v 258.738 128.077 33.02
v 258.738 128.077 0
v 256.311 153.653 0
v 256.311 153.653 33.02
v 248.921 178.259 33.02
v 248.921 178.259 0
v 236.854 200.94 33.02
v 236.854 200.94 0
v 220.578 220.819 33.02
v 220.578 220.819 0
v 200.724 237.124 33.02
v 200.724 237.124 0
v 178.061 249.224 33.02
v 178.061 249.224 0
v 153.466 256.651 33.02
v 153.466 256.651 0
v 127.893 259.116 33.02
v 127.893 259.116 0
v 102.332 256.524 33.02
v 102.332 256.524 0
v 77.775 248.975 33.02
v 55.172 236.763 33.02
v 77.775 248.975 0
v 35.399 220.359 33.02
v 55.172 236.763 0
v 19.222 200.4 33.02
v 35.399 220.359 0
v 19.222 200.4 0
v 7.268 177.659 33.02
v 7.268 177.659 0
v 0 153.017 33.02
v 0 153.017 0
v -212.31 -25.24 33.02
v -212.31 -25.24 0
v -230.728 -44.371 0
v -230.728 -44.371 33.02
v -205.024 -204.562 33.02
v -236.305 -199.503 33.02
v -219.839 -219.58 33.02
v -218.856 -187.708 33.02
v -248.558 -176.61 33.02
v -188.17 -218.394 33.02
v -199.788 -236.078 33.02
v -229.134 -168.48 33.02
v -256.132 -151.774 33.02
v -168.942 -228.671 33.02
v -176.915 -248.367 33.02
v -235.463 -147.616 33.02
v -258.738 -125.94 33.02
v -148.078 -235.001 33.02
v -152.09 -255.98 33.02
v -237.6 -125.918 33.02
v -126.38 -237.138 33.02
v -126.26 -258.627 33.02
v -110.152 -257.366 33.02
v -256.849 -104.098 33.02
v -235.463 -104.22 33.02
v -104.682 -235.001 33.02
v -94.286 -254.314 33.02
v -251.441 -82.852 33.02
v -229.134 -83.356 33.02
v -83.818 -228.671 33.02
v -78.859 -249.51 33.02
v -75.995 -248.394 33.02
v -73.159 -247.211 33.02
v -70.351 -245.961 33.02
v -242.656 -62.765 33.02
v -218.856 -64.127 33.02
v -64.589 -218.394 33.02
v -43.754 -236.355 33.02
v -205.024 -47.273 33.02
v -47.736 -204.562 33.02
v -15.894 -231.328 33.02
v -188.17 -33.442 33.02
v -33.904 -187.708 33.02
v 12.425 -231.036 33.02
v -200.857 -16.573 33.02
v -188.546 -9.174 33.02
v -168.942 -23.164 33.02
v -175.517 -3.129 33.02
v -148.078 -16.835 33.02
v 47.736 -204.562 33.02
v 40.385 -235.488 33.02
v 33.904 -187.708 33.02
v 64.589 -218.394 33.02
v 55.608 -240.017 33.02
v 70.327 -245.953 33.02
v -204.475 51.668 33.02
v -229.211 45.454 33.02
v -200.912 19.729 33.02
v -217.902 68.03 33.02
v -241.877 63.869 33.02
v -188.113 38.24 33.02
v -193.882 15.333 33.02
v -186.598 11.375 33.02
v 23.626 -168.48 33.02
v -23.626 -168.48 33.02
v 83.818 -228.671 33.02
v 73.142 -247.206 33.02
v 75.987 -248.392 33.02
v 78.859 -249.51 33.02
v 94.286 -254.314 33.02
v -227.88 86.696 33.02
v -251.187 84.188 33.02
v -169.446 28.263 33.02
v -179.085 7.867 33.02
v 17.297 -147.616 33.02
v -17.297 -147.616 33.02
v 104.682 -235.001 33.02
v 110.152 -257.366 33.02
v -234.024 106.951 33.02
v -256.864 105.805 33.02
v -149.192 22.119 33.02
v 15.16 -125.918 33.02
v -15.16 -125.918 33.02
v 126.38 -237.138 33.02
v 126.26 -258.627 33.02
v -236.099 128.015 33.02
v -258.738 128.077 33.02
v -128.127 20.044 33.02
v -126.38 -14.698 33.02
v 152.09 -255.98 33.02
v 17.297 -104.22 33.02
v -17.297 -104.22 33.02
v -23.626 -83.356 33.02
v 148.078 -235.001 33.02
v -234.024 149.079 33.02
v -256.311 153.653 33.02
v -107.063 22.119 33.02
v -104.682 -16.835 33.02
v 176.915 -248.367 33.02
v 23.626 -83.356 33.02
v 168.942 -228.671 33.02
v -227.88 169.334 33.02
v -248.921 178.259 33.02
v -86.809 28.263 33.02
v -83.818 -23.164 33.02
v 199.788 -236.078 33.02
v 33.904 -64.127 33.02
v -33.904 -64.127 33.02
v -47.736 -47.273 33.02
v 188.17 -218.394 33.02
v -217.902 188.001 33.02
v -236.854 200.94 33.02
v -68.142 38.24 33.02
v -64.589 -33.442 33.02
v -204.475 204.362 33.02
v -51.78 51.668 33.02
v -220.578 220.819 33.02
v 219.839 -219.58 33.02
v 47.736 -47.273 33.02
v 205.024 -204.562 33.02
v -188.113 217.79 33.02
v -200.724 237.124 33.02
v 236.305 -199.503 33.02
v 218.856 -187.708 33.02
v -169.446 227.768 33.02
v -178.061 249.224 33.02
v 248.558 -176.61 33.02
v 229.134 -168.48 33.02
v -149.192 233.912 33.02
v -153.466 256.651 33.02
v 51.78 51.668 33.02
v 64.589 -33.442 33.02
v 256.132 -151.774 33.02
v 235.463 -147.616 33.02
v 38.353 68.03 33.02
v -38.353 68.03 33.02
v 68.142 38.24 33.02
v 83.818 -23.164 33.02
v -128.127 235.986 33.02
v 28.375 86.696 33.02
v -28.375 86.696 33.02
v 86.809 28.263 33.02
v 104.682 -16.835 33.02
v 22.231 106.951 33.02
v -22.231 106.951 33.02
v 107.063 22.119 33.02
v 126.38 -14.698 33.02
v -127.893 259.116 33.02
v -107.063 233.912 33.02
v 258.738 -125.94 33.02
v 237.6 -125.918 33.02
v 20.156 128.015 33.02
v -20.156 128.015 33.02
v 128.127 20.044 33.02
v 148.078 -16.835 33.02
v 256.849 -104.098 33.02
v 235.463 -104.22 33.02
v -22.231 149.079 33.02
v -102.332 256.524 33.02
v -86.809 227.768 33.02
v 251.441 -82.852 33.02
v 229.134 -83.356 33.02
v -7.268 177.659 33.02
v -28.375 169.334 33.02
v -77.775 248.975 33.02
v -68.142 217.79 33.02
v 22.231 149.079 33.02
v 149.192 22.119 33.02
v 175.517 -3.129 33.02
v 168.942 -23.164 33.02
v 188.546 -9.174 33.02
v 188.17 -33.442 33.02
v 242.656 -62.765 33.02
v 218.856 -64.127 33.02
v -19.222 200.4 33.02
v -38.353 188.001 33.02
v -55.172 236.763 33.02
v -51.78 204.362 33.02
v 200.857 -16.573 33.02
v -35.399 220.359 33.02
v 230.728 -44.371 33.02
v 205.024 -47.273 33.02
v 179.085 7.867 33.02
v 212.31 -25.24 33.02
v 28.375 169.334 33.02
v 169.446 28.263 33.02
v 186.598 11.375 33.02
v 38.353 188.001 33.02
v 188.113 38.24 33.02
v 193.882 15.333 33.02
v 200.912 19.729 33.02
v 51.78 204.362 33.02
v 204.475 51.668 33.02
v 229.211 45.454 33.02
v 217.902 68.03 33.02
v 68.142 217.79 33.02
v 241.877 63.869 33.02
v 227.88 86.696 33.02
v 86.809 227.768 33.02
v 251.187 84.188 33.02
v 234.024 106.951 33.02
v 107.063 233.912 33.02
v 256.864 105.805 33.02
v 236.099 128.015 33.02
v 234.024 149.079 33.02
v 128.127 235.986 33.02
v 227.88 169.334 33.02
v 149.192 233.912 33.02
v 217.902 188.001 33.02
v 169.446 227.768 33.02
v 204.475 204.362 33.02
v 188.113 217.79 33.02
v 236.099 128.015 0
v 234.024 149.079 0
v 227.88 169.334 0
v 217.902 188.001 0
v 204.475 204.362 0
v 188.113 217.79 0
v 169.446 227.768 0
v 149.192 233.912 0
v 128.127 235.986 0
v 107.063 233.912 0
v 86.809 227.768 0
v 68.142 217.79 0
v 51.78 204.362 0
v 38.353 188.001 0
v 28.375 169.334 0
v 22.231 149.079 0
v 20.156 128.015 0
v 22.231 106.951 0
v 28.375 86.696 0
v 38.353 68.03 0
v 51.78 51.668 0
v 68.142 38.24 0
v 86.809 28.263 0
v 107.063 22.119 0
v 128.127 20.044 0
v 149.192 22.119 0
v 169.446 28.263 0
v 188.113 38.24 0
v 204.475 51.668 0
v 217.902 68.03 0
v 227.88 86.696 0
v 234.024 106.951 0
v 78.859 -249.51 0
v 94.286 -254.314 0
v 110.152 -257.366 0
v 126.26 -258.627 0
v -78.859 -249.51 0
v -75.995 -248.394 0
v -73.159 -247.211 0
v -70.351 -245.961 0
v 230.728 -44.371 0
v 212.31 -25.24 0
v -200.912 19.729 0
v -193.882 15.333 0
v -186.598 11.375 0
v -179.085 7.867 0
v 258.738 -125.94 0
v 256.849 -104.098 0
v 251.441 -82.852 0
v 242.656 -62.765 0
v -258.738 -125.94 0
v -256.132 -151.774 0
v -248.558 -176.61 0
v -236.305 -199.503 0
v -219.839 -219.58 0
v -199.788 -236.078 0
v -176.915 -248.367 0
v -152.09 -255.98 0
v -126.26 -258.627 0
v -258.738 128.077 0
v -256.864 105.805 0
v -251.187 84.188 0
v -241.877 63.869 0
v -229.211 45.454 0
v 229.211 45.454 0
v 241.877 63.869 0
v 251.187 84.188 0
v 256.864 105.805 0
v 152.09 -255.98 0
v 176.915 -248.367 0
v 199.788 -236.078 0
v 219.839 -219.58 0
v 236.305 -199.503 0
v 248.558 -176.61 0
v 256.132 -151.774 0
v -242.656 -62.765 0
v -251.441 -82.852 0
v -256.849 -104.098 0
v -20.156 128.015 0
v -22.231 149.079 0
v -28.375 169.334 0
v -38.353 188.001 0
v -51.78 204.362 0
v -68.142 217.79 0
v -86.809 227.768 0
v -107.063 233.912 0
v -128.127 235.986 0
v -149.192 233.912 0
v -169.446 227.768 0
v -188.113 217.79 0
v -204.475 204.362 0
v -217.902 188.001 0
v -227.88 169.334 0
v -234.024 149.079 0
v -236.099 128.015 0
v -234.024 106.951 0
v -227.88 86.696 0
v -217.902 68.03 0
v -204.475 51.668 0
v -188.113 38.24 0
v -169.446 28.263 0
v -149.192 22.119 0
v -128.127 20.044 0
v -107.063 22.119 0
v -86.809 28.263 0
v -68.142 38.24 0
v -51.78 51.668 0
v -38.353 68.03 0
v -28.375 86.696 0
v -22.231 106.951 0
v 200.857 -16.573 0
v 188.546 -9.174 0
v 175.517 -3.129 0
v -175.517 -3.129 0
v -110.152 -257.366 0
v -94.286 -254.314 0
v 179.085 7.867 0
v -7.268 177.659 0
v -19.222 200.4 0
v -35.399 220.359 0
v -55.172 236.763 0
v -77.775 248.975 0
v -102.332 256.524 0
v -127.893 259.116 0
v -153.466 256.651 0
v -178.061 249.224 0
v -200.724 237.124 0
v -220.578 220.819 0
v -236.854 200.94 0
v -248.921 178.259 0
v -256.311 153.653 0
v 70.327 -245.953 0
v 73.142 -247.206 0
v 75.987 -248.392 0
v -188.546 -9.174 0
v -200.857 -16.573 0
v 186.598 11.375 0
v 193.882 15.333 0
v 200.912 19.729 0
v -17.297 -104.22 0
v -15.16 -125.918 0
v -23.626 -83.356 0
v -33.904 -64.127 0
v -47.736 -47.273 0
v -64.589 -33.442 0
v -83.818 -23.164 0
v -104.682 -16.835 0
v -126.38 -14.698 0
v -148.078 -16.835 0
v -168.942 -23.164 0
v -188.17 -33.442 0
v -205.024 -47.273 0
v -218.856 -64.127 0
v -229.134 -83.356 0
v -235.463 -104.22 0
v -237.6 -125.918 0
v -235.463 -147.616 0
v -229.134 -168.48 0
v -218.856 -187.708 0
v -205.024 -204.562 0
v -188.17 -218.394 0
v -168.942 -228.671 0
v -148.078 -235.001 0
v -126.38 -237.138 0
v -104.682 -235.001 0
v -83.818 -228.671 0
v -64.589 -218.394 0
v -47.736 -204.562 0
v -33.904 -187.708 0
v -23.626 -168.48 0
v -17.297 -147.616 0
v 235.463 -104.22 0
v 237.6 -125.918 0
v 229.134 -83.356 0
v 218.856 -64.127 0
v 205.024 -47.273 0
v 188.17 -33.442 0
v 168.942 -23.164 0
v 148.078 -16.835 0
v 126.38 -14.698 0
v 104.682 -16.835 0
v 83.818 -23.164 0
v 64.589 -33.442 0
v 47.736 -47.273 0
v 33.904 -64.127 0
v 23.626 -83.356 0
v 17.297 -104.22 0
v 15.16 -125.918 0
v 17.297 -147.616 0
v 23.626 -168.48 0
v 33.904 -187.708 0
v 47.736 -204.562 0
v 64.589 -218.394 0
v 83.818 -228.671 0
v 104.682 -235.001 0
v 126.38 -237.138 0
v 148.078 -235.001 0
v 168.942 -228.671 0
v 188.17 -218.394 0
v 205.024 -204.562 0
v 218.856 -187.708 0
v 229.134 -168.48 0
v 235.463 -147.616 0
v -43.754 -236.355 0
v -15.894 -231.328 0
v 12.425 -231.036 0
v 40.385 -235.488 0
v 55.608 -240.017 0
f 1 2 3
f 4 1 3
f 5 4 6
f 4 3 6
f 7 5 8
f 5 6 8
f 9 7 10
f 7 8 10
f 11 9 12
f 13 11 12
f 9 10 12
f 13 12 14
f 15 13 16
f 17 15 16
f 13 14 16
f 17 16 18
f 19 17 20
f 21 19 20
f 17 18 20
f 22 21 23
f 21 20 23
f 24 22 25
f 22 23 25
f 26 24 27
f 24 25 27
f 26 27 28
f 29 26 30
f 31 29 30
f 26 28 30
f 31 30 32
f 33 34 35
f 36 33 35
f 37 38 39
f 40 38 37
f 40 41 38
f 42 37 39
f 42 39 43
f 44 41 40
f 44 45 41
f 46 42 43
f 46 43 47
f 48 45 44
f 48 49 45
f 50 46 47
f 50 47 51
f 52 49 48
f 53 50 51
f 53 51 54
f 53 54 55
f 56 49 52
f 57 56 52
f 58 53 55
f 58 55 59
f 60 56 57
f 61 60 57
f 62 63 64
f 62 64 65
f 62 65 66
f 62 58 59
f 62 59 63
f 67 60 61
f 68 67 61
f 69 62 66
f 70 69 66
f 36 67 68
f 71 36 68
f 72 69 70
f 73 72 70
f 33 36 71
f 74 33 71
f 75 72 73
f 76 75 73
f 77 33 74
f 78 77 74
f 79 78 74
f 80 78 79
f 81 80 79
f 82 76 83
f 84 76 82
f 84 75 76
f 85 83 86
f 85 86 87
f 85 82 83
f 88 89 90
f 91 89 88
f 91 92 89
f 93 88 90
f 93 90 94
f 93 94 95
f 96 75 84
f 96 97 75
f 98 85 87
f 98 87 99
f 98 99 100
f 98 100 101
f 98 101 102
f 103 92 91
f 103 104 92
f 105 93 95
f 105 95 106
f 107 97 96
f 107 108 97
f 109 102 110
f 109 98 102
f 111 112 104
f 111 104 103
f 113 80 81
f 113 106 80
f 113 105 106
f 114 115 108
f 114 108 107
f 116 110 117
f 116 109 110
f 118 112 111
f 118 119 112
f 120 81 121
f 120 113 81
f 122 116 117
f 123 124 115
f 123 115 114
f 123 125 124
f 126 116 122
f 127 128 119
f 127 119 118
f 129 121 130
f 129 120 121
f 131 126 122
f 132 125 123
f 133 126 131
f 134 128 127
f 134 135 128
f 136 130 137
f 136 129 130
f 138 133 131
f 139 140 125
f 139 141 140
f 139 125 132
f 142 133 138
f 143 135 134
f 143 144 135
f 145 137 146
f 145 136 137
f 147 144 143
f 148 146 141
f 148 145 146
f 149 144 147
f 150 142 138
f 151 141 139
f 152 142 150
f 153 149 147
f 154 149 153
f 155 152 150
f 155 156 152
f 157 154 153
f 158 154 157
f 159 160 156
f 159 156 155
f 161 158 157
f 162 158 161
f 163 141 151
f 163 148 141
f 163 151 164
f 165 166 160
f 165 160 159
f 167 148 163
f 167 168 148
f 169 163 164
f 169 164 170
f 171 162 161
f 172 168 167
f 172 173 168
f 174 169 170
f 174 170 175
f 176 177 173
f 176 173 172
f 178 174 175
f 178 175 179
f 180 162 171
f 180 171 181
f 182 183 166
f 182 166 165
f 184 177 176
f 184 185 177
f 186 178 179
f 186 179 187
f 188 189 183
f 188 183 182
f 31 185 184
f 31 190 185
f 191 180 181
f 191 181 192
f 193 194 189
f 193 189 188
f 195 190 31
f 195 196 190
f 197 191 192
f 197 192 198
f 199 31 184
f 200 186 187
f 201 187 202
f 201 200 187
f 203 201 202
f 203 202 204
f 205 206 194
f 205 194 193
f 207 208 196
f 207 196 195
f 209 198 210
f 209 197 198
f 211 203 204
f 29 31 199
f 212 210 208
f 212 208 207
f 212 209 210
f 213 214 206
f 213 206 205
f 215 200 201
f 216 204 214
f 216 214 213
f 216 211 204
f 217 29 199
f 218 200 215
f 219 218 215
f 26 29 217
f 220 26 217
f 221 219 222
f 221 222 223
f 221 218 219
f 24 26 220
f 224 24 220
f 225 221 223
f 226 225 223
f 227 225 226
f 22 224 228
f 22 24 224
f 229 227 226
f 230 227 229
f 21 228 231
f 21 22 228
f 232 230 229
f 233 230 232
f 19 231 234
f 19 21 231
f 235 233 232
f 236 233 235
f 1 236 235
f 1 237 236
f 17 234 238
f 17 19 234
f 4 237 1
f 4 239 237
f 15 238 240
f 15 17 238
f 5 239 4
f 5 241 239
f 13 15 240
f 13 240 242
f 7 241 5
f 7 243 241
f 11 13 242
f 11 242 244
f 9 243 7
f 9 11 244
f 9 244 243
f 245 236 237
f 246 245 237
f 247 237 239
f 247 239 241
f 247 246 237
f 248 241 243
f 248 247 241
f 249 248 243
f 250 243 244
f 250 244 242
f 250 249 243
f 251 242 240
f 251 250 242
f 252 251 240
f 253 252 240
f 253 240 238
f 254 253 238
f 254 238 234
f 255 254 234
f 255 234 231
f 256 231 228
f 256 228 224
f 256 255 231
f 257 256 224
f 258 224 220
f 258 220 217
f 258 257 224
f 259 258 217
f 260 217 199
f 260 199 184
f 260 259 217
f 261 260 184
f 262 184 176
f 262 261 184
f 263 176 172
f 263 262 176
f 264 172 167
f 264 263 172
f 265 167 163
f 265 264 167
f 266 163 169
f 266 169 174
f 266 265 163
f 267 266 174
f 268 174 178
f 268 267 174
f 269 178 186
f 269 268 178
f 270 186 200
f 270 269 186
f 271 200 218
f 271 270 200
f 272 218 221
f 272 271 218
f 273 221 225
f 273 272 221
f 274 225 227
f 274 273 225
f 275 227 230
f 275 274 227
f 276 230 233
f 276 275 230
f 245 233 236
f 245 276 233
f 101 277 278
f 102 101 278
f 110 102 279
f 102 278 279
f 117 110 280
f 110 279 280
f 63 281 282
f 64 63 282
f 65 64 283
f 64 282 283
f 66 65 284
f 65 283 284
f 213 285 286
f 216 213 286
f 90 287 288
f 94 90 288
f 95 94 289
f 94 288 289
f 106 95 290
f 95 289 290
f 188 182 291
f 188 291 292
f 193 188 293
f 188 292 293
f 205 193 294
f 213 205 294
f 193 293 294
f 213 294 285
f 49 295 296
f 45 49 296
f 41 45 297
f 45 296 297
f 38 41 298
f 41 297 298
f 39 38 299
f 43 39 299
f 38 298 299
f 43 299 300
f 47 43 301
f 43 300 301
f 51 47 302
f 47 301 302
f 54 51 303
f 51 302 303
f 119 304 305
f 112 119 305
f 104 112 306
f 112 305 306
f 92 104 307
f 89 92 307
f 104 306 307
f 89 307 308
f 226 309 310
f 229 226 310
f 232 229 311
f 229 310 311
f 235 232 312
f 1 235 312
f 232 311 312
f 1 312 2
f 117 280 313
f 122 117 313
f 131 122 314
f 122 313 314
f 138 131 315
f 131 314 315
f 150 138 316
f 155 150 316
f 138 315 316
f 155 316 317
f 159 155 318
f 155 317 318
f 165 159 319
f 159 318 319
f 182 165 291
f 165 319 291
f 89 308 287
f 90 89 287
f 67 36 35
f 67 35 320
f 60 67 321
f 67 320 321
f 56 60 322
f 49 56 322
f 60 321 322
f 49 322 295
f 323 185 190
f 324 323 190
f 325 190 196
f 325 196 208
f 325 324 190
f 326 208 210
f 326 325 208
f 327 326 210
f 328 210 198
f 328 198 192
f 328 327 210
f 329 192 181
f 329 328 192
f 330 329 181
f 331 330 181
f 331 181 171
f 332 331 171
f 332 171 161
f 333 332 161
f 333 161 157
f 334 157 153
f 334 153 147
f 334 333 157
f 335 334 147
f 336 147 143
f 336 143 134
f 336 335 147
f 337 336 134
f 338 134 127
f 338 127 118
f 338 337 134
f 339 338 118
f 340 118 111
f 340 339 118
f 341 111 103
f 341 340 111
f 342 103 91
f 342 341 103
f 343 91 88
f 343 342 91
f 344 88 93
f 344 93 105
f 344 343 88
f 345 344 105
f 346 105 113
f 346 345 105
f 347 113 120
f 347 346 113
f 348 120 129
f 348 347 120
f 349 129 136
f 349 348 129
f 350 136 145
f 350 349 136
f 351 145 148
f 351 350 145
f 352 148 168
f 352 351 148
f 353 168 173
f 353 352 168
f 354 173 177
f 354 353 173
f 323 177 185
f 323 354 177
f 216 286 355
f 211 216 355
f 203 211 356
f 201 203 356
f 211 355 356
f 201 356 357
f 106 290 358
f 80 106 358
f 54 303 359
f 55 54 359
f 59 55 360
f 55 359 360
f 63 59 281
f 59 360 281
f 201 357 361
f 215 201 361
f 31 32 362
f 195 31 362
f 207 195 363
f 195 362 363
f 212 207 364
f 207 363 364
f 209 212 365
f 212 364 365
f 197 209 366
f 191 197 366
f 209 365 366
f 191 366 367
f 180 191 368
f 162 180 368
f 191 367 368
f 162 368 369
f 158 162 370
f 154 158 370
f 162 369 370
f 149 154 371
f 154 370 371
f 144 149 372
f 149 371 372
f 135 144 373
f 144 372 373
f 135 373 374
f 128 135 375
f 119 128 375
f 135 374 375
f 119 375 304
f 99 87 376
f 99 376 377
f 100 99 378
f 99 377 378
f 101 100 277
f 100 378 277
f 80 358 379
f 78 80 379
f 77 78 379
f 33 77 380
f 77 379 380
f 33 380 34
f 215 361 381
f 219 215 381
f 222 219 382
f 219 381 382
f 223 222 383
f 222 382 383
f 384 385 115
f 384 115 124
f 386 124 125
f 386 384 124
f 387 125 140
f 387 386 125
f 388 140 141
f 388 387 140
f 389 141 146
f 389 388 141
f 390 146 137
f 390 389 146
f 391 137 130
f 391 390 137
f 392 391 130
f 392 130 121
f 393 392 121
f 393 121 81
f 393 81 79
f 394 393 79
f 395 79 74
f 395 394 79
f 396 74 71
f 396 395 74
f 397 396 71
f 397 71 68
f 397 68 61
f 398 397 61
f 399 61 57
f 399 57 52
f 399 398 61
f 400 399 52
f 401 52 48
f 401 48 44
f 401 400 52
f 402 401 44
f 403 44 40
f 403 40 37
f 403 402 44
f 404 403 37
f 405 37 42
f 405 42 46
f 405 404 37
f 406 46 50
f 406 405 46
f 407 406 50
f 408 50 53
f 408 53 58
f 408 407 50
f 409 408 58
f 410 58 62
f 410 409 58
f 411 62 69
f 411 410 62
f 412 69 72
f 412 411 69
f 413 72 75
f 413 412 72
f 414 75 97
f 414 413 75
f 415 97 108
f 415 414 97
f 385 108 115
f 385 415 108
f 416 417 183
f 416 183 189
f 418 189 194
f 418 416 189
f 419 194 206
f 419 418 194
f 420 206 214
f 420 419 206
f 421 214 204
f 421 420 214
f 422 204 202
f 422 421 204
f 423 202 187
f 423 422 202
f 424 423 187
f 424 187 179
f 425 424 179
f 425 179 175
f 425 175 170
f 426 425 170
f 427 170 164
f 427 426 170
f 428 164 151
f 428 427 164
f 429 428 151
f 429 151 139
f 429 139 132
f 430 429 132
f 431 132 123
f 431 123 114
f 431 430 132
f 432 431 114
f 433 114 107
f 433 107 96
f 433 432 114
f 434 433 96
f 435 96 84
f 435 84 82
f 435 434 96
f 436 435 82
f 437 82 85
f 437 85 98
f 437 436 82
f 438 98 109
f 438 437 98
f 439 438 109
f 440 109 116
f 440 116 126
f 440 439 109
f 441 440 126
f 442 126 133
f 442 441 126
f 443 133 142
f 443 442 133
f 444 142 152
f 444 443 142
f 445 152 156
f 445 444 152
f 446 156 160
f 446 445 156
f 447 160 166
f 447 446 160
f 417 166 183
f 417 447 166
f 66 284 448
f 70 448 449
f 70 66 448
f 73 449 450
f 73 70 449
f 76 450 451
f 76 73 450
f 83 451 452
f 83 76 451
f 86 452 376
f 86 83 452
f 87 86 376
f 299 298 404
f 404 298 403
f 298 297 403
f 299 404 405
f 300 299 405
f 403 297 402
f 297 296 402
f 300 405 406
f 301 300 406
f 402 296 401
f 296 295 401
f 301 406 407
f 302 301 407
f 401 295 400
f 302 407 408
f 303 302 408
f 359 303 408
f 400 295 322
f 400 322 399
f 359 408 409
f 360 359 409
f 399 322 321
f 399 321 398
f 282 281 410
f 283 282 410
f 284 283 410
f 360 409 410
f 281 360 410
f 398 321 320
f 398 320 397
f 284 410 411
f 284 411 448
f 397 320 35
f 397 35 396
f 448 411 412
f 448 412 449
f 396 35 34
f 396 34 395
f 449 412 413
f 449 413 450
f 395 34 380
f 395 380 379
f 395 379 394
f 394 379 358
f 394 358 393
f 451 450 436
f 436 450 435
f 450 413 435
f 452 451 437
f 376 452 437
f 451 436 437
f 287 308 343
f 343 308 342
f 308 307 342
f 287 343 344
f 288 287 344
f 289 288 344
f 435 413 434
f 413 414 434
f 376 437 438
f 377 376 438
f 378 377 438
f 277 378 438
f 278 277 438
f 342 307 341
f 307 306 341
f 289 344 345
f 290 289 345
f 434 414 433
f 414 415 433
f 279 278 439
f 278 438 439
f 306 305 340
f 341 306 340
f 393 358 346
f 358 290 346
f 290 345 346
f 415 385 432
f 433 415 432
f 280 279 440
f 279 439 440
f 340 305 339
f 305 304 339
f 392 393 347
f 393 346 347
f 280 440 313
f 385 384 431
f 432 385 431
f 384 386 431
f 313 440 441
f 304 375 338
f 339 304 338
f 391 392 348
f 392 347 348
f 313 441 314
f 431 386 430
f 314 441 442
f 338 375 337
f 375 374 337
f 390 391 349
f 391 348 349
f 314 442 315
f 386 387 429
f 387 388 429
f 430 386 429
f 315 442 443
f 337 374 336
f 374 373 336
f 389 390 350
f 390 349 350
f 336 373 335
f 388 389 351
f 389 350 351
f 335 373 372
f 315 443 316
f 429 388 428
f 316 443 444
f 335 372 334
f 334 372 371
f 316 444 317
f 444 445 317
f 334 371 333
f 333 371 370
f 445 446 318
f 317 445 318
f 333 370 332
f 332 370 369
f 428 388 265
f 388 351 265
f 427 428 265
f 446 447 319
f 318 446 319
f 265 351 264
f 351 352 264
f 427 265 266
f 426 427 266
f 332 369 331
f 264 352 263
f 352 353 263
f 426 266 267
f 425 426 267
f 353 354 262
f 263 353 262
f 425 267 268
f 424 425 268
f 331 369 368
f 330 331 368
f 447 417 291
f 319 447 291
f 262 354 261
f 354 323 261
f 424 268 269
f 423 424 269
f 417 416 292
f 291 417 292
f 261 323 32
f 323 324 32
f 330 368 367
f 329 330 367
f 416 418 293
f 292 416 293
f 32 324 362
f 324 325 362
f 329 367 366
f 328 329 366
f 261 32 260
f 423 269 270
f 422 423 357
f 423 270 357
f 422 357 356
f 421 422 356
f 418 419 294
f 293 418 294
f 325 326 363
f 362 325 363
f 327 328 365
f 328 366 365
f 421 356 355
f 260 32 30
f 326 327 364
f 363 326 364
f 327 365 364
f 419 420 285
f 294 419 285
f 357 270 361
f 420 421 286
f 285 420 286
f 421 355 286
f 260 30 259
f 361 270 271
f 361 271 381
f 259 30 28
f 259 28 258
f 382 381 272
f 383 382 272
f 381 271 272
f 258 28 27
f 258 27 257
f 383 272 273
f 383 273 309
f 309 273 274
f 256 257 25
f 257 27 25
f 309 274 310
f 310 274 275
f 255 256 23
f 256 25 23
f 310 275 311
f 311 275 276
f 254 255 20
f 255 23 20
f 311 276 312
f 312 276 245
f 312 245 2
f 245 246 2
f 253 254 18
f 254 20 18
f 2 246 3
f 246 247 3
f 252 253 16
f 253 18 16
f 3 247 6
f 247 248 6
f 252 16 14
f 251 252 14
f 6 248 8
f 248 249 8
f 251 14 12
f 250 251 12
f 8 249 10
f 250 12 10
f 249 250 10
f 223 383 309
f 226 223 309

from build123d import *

# Parameters (mm, degrees)
F2_R     = 111.219822
F2_R_2   = 107.971154
F3_DEPTH = 33.02
F4_R     = 168.535103


with BuildPart() as f3:
    # F2 (on Top) → F3 (new body)
    with BuildSketch(Plane.XY):
        with BuildLine():
            ThreePointArc((-230.728179, -44.370614), (-251.440516, -82.851948), (-258.738101, -125.939757))
            ThreePointArc((-258.738101, -125.939757), (-219.839177, -219.580253), (-126.260236, -258.627027))
            ThreePointArc((-126.260236, -258.627027), (-102.176368, -256.061677), (-78.85915, -249.510258))
            ThreePointArc((-78.85915, -249.510258), (-29.568087, -216.546357), (0, -165.146396))
            ThreePointArc((0, -165.146396), (29.560129, -216.553795), (78.85915, -249.510258))
            ThreePointArc((78.85915, -249.510258), (102.176368, -256.061677), (126.260236, -258.627027))
            ThreePointArc((126.260236, -258.627027), (219.839177, -219.580253), (258.738101, -125.939757))
            ThreePointArc((258.738101, -125.939757), (251.440516, -82.851948), (230.728179, -44.370614))
            Line((230.728179, -44.370614), (212.309614, -25.240019))
            ThreePointArc((212.309614, -25.240019), (194.800133, -12.709117), (175.517112, -3.129424))
            Line((175.517112, -3.129424), (179.085225, 7.86738))
            ThreePointArc((179.085225, 7.86738), (190.270178, 13.298483), (200.912178, 19.728716))
            Line((200.912178, 19.728716), (229.211181, 45.454361))
            ThreePointArc((229.211181, 45.454361), (251.18703, 84.187969), (258.738101, 128.076598))
            ThreePointArc((258.738101, 128.076598), (140.740138, 258.514188), (0, 153.016806))
            ThreePointArc((0, 153.016806), (-140.740138, 258.514188), (-258.738101, 128.076598))
            ThreePointArc((-258.738101, 128.076598), (-251.18703, 84.187969), (-229.211181, 45.454361))
            Line((-229.211181, 45.454361), (-200.912178, 19.728716))
            ThreePointArc((-200.912178, 19.728716), (-190.270178, 13.298483), (-179.085225, 7.86738))
            Line((-179.085225, 7.86738), (-175.517112, -3.129424))
            ThreePointArc((-175.517112, -3.129424), (-194.800133, -12.709117), (-212.309614, -25.240019))
            Line((-212.309614, -25.240019), (-230.728179, -44.370614))
        make_face()
        with Locations((-126.379907, -125.917777)):
            Circle(F2_R, mode=Mode.SUBTRACT)
        with Locations((126.379907, -125.917777)):
            Circle(F2_R, mode=Mode.SUBTRACT)
        with Locations((-128.127411, 128.015205)):
            Circle(F2_R_2, mode=Mode.SUBTRACT)
        with Locations((128.127411, 128.015205)):
            Circle(F2_R_2, mode=Mode.SUBTRACT)
    extrude(amount=F3_DEPTH)

    # F4
    f4_edges = [f3.edges().sort_by_distance(p)[0] for p in [
        (0, -165.146396, 16.51),
    ]]
    fillet(f4_edges, radius=F4_R)


solid = f3.part
